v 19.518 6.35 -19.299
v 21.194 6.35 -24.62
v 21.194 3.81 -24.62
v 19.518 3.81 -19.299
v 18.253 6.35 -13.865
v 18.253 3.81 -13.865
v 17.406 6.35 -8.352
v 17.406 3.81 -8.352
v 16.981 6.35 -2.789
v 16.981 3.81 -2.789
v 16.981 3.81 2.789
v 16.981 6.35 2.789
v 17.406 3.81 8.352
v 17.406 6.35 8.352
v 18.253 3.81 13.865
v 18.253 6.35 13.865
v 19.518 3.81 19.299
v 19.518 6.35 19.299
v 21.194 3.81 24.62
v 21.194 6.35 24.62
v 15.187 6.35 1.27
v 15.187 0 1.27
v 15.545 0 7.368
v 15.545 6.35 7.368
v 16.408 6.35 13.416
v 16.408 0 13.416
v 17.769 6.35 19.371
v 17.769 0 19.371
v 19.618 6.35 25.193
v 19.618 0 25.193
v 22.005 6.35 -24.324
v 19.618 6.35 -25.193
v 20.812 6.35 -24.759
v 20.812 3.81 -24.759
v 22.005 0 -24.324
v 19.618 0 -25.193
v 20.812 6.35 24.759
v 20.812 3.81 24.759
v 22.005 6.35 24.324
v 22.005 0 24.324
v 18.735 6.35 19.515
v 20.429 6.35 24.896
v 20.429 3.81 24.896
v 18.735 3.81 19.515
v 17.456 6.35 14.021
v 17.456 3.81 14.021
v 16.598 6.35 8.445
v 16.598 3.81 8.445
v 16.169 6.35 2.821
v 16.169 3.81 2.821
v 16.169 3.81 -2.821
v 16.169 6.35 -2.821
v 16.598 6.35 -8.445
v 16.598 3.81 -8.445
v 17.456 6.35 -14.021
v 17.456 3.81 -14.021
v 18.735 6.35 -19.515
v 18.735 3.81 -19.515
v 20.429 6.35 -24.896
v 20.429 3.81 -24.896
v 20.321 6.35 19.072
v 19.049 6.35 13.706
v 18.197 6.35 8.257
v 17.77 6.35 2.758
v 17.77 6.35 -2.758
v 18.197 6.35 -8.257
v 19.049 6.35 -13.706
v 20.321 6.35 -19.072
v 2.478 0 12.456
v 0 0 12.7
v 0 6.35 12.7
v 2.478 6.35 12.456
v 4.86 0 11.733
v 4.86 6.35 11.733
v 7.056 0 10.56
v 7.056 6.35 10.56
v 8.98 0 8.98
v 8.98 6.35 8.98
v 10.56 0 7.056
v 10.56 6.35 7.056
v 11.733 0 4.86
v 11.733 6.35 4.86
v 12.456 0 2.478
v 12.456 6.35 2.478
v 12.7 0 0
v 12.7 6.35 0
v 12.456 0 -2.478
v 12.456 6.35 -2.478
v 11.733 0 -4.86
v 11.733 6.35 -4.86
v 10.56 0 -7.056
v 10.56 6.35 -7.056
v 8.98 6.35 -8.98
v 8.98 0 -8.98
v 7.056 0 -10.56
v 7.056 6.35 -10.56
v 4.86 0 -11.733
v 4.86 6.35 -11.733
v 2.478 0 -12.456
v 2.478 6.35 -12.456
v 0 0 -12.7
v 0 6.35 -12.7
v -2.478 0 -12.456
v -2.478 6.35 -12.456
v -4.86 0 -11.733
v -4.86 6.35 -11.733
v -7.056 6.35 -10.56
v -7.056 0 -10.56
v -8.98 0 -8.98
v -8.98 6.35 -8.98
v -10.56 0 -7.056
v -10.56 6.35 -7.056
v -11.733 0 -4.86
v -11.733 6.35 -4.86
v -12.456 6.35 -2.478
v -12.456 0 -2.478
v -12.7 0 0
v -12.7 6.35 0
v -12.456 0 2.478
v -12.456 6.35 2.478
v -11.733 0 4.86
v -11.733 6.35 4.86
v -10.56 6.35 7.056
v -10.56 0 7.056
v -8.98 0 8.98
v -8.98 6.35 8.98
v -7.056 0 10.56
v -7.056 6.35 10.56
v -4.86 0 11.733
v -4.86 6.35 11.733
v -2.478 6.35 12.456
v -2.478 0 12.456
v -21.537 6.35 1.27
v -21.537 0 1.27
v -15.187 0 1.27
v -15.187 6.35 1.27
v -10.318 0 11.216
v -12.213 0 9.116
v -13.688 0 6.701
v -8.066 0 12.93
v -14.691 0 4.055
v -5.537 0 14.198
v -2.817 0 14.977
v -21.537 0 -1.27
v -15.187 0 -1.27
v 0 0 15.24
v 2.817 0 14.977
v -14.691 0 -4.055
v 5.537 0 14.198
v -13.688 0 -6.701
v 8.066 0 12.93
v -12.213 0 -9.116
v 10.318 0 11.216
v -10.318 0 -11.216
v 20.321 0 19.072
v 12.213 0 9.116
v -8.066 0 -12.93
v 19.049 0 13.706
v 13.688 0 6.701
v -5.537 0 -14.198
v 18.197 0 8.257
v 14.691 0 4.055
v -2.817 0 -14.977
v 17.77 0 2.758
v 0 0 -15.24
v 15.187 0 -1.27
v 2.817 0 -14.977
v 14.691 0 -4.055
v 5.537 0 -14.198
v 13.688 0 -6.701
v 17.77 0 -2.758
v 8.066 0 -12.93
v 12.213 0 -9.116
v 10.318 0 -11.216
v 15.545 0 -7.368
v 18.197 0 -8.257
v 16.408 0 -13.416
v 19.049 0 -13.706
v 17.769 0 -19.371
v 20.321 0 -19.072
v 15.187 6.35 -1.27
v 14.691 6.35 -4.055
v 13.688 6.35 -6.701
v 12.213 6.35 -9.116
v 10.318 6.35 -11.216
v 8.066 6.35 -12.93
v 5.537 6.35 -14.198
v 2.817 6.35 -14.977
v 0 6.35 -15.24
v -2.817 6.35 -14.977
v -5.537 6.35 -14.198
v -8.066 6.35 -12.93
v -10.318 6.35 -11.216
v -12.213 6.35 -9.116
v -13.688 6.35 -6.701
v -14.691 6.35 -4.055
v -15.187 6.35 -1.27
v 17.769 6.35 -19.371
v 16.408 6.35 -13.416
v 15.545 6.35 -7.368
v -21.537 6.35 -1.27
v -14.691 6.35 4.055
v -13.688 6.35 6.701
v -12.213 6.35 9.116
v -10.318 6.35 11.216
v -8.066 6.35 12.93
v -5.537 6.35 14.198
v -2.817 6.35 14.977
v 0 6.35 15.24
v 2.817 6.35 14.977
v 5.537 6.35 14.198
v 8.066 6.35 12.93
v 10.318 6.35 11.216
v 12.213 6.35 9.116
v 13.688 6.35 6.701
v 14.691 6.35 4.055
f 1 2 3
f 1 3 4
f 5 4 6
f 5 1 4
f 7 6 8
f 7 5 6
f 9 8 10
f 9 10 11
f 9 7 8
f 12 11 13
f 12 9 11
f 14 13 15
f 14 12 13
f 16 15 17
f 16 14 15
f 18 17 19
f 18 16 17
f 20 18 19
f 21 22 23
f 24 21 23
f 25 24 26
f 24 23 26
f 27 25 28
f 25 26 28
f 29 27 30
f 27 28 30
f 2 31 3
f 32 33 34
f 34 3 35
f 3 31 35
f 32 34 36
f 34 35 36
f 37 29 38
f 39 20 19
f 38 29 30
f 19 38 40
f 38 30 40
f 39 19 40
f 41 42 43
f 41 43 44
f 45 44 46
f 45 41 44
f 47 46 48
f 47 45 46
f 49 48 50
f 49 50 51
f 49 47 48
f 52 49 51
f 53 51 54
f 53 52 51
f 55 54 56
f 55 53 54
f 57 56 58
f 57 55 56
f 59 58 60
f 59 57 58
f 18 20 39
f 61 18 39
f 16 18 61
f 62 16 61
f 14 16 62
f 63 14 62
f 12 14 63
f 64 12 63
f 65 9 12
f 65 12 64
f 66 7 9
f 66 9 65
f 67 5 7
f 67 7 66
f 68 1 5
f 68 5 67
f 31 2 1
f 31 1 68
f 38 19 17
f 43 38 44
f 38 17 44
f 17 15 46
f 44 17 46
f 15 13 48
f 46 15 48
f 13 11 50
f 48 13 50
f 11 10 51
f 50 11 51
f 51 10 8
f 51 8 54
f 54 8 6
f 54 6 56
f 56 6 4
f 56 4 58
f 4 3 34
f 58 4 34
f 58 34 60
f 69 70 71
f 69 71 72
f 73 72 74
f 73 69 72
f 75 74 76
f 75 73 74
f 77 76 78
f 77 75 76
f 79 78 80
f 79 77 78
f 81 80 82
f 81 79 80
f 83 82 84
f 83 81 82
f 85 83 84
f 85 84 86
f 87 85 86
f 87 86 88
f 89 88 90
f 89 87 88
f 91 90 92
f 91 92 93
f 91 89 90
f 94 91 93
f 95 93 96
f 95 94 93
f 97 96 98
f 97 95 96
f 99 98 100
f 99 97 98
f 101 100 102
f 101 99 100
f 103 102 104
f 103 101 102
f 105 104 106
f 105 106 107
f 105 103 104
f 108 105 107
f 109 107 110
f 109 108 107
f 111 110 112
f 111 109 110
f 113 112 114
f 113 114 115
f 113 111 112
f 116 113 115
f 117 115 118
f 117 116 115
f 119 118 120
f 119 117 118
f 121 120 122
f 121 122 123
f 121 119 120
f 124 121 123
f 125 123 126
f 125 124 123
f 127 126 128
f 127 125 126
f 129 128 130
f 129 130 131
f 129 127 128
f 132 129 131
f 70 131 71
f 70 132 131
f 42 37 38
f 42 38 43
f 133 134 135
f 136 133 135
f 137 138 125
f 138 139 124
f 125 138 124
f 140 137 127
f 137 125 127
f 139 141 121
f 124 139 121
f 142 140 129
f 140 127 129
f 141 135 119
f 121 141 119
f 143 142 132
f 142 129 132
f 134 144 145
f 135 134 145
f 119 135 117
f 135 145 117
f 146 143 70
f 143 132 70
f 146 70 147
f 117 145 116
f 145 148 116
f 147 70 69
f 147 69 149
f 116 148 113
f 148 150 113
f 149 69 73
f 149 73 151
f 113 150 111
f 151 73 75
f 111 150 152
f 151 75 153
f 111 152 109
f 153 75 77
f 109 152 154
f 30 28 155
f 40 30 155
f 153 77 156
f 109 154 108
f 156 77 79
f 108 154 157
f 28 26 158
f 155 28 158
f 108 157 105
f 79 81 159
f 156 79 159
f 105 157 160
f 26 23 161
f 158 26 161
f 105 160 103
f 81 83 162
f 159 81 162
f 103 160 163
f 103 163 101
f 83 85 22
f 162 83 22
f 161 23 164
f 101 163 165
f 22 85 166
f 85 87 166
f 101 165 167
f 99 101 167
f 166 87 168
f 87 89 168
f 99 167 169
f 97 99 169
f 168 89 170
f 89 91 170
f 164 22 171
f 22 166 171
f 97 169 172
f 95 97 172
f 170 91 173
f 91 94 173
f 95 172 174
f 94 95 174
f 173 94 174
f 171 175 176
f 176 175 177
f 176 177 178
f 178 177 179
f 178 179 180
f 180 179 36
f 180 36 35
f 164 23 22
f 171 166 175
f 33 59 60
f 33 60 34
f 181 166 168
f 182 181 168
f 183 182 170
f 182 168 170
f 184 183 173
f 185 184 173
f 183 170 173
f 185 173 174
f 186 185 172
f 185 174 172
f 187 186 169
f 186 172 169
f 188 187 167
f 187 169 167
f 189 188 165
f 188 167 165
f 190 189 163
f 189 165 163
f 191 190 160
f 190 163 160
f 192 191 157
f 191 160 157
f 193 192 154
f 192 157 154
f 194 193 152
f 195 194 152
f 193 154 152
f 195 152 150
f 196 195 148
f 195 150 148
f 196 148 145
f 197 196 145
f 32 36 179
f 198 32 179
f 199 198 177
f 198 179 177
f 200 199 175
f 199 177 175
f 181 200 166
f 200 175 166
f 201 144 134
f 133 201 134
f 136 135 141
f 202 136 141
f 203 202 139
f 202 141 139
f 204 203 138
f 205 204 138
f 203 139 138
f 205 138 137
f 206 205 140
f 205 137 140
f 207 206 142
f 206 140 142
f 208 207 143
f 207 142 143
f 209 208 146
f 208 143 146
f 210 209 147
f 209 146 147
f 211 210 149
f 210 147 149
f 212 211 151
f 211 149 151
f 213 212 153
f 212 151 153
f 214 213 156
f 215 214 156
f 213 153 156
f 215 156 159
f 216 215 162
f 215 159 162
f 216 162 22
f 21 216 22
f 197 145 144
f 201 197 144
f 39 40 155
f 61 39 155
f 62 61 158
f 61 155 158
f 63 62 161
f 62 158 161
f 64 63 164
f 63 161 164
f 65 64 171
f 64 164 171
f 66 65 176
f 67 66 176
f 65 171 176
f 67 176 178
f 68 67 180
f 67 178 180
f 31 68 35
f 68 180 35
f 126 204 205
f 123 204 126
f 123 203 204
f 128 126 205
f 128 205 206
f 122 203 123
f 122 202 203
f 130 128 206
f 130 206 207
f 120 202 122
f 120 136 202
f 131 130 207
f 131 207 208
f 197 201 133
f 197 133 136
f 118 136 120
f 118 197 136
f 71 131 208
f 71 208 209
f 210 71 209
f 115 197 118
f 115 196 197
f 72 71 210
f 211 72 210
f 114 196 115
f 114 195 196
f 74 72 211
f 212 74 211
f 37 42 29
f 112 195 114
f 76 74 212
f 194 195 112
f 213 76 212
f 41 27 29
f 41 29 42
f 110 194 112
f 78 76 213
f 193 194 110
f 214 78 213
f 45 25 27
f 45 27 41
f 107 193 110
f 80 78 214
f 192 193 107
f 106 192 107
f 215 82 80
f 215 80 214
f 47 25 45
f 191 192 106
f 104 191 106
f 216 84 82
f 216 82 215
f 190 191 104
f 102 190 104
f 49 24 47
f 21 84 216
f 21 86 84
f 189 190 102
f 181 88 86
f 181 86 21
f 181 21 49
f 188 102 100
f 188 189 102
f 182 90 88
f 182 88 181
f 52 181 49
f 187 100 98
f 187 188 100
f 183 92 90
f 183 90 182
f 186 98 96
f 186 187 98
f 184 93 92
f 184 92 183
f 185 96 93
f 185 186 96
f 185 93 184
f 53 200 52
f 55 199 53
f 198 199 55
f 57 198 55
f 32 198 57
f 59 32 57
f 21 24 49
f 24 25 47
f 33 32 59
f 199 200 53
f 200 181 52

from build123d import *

# Parameters (mm, degrees)
SKETCH1_R           = 12.7
BOSS_EXTRUDE1_DEPTH = 6.35
CUT_EXTRUDE1_DEPTH  = 2.54


with BuildPart() as part:
    # Sketch1 → Boss-Extrude1 (new body)
    with BuildSketch(Plane(origin=(0, 0, 0), x_dir=(1, 0, 0), z_dir=(0, 1, 0))):
        with BuildLine():
            Line((-21.536991144, 1.27), (-21.536991144, -1.27))
            Line((-21.536991144, -1.27), (-15.186991144, -1.27))
            ThreePointArc((-15.186991144, -1.27), (0, -15.24), (15.186991144, -1.27))
            ThreePointArc((15.186991144, -1.27), (16.408069395, -13.415825599), (19.618283607, -25.193203757))
            Line((19.618283607, -25.193203757), (22.005102864, -24.324472593))
            ThreePointArc((22.005102864, -24.324472593), (17.716042054, 0), (22.005102864, 24.324472593))
            Line((22.005102864, 24.324472593), (19.618283607, 25.193203757))
            ThreePointArc((19.618283607, 25.193203757), (16.408069395, 13.415825599), (15.186991144, 1.27))
            ThreePointArc((15.186991144, 1.27), (0, 15.24), (-15.186991144, 1.27))
            Line((-15.186991144, 1.27), (-21.536991144, 1.27))
        make_face()
        with Locations(Location((0, 0, 0), (0, 0, 270))):
            Circle(SKETCH1_R, mode=Mode.SUBTRACT)
    extrude(amount=BOSS_EXTRUDE1_DEPTH)

    # Sketch2 → Cut-Extrude1 (cut)
    with BuildSketch(Plane(origin=(0, 6.35, 0), x_dir=(1, 0, 0), z_dir=(0, 1, 0))):
        with BuildLine():
            Line((20.428988318, 24.895578462), (21.194398153, 24.622097889))
            ThreePointArc((21.194398153, 24.622097889), (16.927750399, 0), (21.194398153, -24.622097889))
            Line((21.194398153, -24.622097889), (20.428988318, -24.895578462))
            ThreePointArc((20.428988318, -24.895578462), (16.114950399, 0), (20.428988318, 24.895578462))
        make_face()
    extrude(amount=-CUT_EXTRUDE1_DEPTH, mode=Mode.SUBTRACT)


solid = part.part
